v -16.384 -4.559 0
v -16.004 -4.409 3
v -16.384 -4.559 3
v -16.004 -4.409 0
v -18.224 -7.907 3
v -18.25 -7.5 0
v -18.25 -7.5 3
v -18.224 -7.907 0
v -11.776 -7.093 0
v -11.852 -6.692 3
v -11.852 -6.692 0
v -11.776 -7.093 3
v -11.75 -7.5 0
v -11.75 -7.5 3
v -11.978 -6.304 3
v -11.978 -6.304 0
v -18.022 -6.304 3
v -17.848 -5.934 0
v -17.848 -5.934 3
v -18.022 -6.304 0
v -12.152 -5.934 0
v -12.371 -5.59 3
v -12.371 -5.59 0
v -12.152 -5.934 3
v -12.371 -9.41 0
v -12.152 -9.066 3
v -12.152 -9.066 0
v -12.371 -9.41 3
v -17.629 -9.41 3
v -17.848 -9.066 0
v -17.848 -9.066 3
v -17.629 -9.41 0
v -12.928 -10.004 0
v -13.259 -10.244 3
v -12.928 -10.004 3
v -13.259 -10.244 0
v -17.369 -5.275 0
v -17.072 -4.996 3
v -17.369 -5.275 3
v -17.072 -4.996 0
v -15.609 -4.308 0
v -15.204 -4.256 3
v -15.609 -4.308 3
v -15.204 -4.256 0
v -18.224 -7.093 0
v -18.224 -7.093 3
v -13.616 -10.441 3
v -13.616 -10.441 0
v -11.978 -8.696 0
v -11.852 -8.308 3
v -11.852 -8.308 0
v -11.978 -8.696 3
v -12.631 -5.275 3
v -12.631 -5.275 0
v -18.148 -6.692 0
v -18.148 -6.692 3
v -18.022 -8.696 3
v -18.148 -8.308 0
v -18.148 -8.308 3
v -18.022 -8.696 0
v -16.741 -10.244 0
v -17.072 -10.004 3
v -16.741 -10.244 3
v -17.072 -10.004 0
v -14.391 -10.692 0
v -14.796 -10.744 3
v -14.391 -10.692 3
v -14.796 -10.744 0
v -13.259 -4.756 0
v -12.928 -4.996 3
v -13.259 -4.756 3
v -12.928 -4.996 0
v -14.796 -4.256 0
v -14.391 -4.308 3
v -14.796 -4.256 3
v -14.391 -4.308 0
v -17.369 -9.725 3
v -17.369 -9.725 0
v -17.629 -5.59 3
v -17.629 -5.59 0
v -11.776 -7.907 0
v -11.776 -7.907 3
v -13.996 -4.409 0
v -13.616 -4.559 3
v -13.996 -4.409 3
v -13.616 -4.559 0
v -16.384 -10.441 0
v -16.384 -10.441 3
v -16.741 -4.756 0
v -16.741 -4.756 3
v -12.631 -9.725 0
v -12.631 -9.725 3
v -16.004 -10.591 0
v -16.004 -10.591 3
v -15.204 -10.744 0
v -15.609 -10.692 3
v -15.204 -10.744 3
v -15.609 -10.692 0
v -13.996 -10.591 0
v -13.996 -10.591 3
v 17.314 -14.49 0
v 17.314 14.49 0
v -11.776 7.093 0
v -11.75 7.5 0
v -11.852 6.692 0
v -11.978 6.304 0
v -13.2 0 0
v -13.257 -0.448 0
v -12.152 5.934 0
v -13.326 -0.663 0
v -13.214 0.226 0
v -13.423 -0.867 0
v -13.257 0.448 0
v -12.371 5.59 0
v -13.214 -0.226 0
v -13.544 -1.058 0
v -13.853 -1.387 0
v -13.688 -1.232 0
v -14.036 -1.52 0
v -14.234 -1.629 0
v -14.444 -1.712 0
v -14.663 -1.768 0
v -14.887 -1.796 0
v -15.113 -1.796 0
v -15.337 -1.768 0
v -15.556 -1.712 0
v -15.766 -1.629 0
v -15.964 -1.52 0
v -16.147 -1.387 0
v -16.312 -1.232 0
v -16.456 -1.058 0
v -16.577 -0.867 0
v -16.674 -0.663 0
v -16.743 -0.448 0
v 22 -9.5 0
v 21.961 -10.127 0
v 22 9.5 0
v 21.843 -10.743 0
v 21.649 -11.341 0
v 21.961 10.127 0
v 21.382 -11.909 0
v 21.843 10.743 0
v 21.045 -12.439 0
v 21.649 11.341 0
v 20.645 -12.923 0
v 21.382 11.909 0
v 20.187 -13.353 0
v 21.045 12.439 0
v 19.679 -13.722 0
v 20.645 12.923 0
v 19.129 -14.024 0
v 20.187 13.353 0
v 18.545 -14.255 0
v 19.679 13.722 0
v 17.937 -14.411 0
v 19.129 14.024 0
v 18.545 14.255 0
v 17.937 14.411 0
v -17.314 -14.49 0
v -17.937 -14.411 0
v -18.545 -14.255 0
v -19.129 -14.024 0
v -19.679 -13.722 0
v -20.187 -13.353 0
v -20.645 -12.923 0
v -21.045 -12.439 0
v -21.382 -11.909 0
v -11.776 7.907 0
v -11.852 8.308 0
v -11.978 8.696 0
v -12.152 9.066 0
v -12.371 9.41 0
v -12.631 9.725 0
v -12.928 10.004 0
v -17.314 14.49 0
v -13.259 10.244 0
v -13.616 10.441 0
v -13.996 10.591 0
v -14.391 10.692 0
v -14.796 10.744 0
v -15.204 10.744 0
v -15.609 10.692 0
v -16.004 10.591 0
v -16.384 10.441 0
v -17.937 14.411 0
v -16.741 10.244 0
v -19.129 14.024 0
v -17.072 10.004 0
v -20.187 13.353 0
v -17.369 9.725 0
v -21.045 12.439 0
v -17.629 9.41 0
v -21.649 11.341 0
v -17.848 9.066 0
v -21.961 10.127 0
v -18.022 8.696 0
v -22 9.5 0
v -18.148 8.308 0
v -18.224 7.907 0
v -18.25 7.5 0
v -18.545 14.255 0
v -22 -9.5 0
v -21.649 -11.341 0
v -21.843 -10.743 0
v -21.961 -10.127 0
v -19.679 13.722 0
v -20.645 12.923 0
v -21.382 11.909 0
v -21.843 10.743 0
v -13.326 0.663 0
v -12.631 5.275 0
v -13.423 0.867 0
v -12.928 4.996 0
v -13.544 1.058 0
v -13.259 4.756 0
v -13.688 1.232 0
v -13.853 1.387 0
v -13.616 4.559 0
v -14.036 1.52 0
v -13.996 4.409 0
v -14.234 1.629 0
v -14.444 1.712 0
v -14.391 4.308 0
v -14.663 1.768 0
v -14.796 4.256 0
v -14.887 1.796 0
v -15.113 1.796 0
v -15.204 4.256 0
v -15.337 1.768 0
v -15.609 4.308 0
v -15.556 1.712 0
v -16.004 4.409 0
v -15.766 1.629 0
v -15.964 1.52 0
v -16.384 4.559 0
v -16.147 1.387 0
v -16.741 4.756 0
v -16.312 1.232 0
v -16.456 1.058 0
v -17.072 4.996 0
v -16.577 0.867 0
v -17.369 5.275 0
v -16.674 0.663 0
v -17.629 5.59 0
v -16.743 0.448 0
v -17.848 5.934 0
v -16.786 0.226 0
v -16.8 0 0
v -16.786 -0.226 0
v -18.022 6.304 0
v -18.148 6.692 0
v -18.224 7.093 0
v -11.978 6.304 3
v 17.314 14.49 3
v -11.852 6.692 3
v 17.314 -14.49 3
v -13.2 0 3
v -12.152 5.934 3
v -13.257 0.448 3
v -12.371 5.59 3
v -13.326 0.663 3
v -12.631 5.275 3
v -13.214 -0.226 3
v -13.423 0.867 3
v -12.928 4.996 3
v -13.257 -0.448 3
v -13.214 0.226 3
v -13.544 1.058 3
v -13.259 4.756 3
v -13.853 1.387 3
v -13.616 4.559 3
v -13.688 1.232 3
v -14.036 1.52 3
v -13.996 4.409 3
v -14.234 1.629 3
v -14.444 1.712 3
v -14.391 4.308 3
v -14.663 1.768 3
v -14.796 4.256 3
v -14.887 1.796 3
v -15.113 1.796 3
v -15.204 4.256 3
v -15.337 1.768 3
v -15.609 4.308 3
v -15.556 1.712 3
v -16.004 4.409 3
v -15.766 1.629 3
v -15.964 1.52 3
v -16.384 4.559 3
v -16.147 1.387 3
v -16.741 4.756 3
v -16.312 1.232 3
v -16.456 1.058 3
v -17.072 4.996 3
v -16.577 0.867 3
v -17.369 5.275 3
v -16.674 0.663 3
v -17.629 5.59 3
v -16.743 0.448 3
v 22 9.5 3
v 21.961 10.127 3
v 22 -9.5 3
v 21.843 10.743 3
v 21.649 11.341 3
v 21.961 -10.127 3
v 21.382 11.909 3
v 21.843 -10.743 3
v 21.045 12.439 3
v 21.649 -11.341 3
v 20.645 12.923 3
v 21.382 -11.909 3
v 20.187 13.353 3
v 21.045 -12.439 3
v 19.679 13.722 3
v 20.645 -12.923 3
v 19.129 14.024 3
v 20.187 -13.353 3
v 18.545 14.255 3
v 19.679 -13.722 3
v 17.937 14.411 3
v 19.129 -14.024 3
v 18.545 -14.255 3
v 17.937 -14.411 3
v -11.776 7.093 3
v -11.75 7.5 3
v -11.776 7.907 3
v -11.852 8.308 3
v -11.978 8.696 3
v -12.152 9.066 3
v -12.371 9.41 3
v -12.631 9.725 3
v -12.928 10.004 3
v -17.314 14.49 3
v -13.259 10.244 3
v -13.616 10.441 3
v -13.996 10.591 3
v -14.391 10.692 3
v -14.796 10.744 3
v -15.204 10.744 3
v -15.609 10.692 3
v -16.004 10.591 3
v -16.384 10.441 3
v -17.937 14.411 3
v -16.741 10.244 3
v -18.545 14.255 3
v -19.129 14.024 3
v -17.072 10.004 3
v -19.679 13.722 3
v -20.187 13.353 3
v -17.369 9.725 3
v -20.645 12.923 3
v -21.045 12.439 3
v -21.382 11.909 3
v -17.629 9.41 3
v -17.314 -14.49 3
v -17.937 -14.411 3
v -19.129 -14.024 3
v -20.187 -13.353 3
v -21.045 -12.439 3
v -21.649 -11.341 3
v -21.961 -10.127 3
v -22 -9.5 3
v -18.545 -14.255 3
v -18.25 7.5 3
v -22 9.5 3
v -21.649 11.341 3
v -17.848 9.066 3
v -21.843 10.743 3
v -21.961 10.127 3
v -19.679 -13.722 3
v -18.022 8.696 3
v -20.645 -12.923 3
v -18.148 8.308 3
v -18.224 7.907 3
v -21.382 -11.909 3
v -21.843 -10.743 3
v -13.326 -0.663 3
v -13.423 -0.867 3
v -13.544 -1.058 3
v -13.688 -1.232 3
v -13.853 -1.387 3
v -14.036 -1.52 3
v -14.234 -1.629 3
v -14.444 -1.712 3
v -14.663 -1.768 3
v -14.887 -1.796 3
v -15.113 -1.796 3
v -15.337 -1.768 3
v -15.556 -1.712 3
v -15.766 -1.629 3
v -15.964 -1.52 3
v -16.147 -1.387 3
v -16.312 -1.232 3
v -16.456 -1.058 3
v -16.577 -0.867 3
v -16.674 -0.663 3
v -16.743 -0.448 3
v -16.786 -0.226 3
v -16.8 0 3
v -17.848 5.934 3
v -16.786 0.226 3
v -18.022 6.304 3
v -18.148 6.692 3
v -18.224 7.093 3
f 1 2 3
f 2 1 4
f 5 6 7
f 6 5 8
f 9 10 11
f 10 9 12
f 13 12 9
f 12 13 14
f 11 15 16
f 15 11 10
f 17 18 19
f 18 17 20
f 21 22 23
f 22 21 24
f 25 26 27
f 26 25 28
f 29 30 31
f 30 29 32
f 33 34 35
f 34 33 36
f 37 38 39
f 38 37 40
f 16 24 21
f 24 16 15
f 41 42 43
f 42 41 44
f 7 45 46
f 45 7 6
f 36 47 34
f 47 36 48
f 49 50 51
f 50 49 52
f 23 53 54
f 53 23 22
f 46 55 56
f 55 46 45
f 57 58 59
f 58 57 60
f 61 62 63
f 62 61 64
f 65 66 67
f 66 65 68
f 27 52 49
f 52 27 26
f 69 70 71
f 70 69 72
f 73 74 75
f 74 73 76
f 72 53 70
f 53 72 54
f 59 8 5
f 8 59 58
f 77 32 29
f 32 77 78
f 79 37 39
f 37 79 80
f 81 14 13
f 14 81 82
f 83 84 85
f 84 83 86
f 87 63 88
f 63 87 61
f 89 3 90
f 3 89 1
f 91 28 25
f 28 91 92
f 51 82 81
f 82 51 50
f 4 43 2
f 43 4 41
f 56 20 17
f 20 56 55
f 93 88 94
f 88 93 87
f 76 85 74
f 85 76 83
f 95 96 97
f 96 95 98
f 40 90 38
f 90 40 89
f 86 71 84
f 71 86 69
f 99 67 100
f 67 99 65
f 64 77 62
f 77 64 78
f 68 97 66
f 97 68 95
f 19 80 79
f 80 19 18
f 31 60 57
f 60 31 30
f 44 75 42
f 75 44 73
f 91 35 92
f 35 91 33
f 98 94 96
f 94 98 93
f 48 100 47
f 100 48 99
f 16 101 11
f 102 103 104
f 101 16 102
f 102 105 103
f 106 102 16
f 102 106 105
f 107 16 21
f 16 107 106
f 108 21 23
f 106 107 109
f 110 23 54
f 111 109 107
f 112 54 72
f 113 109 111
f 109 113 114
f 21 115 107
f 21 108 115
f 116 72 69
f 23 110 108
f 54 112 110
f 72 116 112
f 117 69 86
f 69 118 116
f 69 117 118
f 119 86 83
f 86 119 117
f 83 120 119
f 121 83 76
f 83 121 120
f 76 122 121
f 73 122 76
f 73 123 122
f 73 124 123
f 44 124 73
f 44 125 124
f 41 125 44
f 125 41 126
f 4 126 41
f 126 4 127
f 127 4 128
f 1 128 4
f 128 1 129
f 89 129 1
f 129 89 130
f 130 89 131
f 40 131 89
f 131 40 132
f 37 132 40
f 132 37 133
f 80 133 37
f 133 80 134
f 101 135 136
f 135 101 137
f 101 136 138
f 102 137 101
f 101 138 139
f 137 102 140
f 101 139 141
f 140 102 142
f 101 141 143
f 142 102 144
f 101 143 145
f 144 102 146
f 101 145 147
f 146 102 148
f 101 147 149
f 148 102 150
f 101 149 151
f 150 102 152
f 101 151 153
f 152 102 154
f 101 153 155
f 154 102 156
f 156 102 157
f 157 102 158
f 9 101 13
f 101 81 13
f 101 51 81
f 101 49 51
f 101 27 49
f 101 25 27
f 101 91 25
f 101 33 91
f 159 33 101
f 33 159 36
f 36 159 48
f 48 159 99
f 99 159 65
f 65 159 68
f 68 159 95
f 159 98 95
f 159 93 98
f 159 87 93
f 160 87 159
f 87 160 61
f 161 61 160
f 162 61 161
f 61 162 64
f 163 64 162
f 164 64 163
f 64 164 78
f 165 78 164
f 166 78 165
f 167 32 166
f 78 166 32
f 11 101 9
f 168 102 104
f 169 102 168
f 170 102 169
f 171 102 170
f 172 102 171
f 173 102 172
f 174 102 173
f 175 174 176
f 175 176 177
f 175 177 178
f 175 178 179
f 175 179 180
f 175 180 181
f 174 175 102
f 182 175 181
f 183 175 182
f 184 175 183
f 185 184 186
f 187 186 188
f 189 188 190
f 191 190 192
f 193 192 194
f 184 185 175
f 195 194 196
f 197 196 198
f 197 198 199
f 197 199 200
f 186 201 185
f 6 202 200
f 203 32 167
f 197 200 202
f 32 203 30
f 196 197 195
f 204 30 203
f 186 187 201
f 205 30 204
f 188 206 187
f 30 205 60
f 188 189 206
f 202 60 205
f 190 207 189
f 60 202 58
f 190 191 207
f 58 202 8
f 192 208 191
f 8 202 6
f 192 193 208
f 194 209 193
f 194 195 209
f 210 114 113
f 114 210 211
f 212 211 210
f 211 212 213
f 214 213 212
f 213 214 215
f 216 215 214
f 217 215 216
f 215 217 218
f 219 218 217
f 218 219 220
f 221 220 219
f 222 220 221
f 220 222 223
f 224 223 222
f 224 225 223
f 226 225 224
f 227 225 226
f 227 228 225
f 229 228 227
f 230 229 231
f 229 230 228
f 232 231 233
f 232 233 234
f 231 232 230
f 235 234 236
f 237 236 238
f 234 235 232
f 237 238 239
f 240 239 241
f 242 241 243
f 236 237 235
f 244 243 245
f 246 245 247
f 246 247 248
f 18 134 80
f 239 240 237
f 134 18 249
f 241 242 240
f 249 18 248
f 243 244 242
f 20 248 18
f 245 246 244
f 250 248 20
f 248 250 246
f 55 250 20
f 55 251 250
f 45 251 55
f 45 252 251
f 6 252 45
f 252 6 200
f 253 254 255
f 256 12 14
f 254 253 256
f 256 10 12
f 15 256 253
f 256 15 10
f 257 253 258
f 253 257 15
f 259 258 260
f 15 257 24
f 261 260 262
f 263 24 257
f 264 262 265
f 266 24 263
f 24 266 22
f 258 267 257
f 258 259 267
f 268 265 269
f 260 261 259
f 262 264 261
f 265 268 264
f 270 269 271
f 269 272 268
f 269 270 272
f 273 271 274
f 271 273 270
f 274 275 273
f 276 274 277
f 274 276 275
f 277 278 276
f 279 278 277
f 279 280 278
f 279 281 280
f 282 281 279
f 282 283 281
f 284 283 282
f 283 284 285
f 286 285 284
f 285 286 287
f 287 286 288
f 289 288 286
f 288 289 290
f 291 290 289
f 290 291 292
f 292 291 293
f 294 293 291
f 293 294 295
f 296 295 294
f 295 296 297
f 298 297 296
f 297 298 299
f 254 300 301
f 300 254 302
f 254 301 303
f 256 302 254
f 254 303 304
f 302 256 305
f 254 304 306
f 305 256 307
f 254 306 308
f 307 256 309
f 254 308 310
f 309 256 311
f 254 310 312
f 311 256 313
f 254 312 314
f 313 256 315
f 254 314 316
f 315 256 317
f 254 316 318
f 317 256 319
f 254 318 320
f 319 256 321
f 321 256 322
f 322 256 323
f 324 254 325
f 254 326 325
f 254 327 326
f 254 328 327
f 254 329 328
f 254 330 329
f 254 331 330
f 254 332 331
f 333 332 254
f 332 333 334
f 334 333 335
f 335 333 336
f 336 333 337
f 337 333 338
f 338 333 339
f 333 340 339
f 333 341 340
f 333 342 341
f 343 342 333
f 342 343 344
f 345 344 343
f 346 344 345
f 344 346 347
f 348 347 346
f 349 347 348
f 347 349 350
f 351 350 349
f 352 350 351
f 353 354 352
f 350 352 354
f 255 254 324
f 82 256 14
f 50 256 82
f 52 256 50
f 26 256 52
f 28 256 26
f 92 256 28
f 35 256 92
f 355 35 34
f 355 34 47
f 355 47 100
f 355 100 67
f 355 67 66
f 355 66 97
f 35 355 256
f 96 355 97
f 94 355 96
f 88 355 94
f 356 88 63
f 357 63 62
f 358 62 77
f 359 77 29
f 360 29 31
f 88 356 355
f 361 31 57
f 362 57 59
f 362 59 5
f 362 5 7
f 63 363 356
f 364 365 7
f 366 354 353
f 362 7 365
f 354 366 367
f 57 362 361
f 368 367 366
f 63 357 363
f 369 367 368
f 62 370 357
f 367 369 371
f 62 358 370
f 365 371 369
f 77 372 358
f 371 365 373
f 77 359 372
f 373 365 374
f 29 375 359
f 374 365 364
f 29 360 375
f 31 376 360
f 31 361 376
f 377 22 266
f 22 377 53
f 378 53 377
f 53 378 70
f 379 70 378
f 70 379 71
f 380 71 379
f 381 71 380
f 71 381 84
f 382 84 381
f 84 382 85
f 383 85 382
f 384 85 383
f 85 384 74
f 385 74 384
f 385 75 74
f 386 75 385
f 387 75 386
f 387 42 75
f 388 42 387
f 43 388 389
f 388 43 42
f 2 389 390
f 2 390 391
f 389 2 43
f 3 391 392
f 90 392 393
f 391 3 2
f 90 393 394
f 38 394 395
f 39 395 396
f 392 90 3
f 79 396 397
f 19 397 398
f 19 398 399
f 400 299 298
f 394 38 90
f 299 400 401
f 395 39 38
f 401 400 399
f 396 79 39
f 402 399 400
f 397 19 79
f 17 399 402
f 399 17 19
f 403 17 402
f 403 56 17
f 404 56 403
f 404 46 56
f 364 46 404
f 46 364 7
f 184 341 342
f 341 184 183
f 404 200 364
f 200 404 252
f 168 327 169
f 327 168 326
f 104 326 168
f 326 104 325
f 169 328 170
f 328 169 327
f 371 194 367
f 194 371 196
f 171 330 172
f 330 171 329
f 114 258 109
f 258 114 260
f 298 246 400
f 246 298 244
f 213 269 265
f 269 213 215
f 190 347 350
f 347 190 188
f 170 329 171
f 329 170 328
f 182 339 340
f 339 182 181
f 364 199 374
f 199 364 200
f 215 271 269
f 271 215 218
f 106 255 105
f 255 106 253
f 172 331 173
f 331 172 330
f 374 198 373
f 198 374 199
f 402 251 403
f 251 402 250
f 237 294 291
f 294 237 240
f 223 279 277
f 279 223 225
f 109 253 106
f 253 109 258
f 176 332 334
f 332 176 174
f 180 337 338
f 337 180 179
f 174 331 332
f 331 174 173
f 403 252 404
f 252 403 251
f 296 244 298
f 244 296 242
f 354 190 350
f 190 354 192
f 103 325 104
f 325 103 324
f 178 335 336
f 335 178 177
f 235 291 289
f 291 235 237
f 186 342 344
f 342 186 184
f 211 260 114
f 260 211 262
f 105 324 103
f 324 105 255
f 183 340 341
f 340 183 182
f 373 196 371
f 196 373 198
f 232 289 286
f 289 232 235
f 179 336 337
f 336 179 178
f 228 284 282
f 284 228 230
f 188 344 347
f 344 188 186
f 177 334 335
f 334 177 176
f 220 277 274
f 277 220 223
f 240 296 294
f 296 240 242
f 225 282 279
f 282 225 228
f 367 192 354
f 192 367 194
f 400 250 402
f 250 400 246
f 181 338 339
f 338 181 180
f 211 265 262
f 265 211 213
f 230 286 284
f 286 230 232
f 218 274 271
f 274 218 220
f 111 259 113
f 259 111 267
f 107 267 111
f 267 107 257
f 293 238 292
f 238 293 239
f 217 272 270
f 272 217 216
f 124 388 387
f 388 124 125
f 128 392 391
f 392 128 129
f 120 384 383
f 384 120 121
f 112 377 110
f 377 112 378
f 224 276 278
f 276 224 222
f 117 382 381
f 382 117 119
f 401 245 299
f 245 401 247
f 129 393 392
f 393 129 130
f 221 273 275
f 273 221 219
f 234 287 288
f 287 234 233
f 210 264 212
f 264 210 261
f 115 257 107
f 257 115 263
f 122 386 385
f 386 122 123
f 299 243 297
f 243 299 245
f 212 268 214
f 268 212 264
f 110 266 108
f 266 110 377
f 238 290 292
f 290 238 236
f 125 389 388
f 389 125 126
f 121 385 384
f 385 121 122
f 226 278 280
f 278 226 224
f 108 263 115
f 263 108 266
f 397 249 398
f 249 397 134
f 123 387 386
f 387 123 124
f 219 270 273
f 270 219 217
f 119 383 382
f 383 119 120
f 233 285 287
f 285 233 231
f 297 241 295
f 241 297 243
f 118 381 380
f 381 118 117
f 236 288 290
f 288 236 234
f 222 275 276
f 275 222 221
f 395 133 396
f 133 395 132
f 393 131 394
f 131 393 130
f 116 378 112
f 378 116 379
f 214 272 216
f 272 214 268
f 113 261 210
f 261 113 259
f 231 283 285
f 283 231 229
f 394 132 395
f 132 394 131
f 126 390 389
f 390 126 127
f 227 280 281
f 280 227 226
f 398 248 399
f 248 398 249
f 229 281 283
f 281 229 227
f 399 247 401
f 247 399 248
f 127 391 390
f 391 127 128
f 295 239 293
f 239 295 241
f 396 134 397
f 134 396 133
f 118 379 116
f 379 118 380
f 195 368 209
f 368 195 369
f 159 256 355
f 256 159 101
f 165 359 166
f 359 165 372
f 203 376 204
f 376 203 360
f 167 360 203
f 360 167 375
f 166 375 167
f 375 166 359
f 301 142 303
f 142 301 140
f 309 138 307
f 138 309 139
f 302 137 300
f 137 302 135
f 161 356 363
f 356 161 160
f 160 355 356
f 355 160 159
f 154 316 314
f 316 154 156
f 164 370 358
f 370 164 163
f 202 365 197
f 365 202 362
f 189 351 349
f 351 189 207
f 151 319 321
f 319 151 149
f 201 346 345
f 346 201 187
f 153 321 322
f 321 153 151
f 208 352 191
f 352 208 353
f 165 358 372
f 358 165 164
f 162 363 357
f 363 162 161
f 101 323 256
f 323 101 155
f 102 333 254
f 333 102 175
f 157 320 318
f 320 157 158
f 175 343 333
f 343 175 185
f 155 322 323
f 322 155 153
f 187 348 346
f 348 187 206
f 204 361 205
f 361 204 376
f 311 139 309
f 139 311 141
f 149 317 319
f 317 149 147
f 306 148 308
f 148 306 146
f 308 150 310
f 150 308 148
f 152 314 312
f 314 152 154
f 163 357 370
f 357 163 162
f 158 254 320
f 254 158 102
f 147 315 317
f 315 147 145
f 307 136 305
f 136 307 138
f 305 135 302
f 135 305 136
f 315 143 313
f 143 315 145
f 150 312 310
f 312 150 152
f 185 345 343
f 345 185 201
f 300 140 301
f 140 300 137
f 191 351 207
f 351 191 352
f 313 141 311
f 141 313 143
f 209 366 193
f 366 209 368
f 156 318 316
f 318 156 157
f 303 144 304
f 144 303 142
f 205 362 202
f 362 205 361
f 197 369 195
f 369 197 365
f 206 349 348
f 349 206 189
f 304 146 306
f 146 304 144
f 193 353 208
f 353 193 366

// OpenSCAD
$fn = 50;


difference() {
	union() {
		hull() {
			translate(v = [-17.0000000000, 9.5000000000, 0]) {
				cylinder(h = 3, r = 5);
			}
			translate(v = [17.0000000000, 9.5000000000, 0]) {
				cylinder(h = 3, r = 5);
			}
			translate(v = [-17.0000000000, -9.5000000000, 0]) {
				cylinder(h = 3, r = 5);
			}
			translate(v = [17.0000000000, -9.5000000000, 0]) {
				cylinder(h = 3, r = 5);
			}
		}
	}
	union() {
		translate(v = [-15.0000000000, -7.5000000000, 0]) {
			cylinder(h = 3, r = 3.2500000000);
		}
		translate(v = [-15.0000000000, 7.5000000000, 0]) {
			cylinder(h = 3, r = 3.2500000000);
		}
		translate(v = [-15.0000000000, -7.5000000000, 0]) {
			cylinder(h = 3, r = 1.8000000000);
		}
		translate(v = [-15.0000000000, 0.0000000000, 0]) {
			cylinder(h = 3, r = 1.8000000000);
		}
		translate(v = [-15.0000000000, 7.5000000000, 0]) {
			cylinder(h = 3, r = 1.8000000000);
		}
		translate(v = [-15.0000000000, -7.5000000000, 0]) {
			cylinder(h = 3, r = 1.8000000000);
		}
		translate(v = [-15.0000000000, 0.0000000000, 0]) {
			cylinder(h = 3, r = 1.8000000000);
		}
		translate(v = [-15.0000000000, 7.5000000000, 0]) {
			cylinder(h = 3, r = 1.8000000000);
		}
		translate(v = [-15.0000000000, -7.5000000000, 0]) {
			cylinder(h = 3, r = 1.8000000000);
		}
		translate(v = [-15.0000000000, 0.0000000000, 0]) {
			cylinder(h = 3, r = 1.8000000000);
		}
		translate(v = [-15.0000000000, 7.5000000000, 0]) {
			cylinder(h = 3, r = 1.8000000000);
		}
	}
}
